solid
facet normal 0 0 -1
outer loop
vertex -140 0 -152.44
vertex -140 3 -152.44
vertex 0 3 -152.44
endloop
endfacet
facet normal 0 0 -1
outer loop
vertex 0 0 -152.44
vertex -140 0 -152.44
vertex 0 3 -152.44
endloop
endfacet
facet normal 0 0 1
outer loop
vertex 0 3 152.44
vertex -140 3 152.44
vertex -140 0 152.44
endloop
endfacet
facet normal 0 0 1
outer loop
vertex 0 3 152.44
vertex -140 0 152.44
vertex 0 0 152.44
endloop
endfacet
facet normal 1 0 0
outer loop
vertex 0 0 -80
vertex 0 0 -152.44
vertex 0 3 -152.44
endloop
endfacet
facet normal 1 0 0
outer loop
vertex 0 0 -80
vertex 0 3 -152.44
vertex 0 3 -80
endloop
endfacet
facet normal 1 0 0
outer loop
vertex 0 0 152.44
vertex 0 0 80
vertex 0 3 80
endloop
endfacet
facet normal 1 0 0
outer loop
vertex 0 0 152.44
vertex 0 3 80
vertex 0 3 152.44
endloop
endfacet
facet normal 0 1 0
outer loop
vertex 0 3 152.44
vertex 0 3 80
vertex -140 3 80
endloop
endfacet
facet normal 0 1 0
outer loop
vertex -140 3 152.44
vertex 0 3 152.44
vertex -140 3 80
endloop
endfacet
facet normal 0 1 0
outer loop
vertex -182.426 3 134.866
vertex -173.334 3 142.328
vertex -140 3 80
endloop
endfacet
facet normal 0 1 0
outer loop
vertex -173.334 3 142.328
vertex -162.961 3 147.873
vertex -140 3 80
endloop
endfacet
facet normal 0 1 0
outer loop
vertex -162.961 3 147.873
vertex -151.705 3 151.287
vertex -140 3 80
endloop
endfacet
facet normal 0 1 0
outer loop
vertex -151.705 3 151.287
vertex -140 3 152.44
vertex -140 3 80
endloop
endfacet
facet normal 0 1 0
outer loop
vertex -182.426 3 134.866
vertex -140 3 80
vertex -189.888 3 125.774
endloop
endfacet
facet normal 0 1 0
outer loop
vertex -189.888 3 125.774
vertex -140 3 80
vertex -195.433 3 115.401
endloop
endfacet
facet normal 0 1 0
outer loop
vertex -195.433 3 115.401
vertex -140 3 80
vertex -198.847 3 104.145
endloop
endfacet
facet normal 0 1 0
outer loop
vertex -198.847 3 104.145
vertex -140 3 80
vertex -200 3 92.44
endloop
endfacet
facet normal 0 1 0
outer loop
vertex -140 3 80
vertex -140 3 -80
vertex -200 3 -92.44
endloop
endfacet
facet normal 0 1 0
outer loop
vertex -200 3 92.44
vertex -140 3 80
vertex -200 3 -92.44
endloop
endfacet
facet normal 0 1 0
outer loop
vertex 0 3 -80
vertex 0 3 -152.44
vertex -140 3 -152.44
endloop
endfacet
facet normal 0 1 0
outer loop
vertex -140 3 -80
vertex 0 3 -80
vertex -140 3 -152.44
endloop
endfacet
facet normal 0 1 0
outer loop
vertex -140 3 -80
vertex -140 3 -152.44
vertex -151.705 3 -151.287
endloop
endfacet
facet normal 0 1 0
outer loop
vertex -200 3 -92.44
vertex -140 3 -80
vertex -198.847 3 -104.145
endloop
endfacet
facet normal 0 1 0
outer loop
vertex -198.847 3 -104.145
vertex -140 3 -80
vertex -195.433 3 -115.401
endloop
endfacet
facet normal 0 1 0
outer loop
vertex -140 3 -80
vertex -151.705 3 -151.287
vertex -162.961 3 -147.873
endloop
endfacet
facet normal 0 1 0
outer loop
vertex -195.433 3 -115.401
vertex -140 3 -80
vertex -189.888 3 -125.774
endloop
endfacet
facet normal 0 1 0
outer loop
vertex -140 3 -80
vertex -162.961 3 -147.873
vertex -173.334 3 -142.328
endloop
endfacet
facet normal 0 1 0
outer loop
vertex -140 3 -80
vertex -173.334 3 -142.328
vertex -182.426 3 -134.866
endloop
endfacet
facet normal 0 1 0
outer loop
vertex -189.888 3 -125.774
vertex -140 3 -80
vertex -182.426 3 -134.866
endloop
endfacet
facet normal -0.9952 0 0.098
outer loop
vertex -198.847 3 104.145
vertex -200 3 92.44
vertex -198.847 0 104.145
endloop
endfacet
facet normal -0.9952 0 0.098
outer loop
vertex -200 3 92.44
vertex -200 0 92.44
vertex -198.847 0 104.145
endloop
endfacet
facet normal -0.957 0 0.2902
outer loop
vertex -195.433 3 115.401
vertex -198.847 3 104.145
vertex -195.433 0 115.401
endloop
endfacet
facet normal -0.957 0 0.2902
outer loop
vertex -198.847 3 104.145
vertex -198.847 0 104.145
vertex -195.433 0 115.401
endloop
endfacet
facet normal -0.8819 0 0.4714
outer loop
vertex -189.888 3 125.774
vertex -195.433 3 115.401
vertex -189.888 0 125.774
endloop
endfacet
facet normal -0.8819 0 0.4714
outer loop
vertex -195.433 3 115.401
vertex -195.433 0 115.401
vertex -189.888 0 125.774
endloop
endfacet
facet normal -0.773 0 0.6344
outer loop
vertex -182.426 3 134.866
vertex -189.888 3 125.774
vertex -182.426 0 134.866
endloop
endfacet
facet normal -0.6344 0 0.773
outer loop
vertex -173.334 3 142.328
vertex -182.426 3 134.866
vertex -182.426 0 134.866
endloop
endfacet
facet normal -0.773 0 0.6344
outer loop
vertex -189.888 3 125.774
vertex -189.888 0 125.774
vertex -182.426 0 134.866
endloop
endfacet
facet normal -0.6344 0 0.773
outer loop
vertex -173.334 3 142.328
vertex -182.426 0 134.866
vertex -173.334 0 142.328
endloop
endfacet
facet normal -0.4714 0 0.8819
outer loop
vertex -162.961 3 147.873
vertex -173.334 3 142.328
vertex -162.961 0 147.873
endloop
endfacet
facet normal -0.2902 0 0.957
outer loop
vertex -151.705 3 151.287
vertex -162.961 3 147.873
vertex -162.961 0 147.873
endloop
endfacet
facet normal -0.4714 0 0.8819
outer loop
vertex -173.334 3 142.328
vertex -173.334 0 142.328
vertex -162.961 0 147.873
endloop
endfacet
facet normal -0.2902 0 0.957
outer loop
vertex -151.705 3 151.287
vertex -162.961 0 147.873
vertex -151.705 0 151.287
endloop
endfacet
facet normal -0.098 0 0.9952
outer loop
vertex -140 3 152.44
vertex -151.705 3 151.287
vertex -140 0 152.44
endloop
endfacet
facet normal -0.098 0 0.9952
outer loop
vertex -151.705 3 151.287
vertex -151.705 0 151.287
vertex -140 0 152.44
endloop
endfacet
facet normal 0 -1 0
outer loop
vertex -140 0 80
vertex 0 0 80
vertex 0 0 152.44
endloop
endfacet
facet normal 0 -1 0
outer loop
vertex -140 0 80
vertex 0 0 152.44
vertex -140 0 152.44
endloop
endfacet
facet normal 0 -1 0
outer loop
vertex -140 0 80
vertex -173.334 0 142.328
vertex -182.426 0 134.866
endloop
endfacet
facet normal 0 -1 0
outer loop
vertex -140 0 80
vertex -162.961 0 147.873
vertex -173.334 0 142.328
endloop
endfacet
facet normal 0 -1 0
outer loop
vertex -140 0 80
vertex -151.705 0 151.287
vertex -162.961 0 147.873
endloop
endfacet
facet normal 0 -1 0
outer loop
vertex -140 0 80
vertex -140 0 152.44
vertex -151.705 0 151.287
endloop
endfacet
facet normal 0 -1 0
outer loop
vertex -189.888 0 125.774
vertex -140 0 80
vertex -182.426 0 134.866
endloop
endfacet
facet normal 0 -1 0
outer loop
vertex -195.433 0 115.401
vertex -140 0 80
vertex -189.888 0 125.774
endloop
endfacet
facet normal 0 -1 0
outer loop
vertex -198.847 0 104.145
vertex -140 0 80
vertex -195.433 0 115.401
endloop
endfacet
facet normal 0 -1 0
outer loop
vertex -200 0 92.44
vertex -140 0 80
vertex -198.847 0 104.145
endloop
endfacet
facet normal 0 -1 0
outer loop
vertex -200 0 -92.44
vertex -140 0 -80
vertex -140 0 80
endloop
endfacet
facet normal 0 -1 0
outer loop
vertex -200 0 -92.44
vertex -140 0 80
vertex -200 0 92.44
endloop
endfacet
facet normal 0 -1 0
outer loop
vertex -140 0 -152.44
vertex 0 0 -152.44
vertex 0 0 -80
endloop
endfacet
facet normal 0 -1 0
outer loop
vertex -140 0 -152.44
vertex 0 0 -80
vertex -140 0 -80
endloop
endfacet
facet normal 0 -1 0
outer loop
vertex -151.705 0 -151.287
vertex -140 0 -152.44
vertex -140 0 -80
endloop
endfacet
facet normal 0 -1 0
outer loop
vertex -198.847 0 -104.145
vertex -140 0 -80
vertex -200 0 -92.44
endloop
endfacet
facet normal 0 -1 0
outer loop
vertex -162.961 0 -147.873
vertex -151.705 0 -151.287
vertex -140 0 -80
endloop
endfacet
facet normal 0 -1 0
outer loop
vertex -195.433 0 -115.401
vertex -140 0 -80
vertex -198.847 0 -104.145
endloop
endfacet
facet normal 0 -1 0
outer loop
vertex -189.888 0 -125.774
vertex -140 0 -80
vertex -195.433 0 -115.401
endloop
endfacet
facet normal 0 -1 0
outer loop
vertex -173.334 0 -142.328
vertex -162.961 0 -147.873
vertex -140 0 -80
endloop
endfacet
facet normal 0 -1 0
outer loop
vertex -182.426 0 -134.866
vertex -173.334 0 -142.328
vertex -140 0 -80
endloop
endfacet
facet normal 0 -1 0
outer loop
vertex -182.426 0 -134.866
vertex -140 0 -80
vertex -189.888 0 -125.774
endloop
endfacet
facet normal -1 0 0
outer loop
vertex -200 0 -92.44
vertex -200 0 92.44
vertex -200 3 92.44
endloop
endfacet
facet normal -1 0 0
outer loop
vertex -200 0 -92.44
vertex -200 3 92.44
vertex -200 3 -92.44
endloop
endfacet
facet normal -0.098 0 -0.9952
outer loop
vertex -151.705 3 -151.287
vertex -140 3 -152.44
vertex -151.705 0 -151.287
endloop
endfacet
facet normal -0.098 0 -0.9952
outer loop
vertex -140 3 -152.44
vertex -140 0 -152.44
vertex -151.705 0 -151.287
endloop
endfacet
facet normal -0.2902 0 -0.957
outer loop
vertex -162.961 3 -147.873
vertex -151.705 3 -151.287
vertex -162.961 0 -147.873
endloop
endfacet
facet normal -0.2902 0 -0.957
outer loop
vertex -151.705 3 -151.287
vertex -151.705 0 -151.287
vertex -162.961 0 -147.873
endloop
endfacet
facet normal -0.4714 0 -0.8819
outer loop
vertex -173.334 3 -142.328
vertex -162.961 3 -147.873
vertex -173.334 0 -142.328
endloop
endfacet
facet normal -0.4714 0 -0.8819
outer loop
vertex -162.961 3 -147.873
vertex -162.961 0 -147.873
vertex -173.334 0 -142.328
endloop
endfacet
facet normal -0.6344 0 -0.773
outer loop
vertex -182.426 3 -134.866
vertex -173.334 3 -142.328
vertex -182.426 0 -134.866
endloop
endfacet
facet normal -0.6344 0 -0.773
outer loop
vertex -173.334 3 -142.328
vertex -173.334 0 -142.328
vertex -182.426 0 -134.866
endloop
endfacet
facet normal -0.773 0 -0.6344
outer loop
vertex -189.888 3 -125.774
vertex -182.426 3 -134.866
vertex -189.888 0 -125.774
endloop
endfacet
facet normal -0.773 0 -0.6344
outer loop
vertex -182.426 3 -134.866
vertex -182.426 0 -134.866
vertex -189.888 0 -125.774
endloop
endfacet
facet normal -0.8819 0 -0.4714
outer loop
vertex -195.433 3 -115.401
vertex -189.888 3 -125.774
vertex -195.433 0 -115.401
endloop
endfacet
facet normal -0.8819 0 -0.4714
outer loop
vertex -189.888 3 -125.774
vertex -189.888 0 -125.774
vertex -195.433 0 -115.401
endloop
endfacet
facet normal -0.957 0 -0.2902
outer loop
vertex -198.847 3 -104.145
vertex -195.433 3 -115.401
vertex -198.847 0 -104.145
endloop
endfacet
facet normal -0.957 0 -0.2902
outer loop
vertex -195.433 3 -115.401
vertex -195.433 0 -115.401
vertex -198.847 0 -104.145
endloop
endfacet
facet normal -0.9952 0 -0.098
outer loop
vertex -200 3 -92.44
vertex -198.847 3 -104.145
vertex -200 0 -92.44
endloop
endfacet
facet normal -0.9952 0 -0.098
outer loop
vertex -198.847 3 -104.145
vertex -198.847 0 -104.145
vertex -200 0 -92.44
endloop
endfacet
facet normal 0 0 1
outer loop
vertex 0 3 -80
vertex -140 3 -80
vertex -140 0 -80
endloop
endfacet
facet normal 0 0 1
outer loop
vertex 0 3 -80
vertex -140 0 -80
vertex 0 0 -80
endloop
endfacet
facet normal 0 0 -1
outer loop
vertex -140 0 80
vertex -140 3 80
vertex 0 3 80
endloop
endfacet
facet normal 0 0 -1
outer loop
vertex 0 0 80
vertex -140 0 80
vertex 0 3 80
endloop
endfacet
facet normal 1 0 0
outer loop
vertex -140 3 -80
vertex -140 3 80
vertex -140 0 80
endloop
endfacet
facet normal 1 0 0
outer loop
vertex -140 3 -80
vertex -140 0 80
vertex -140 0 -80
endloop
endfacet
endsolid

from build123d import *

# Parameters (mm, degrees)
SALIENTE_EXTRUIR1_DEPTH = 3
CROQUIS2_W              = 200
CROQUIS2_H              = 2.56
CORTAR_EXTRUIR1_DEPTH   = 10
CROQUIS3_W              = 140
CROQUIS3_H              = 160
CORTAR_EXTRUIR2_DEPTH   = 10
REDONDEO1_R             = 60


with BuildPart() as part:
    # Croquis1 → Saliente-Extruir1 (new body)
    with BuildSketch(Plane(origin=(0, 0, 0), x_dir=(1, 0, 0), z_dir=(0, 1, 0))):
        Polygon((-100, 155), (0, 155), (0, -155), (-100, -155), (-150, -155), (-200, -155), (-200, 155), (-150, 155), align=None)
    extrude(amount=SALIENTE_EXTRUIR1_DEPTH)

    # Croquis2 → Cortar-Extruir1 (cut)
    with BuildSketch(Plane(origin=(0, 3, 0), x_dir=(1, 0, 0), z_dir=(0, 1, 0))):
        with Locations((-100, 153.72)):
            Rectangle(CROQUIS2_W, CROQUIS2_H)
        with Locations((-100, -153.72)):
            Rectangle(CROQUIS2_W, CROQUIS2_H)
    extrude(amount=-CORTAR_EXTRUIR1_DEPTH, mode=Mode.SUBTRACT)

    # Croquis3 → Cortar-Extruir2 (cut)
    with BuildSketch(Plane(origin=(0, 3, 0), x_dir=(1, 0, 0), z_dir=(0, 1, 0))):
        with Locations((-70, 0)):
            Rectangle(CROQUIS3_W, CROQUIS3_H)
    extrude(amount=-CORTAR_EXTRUIR2_DEPTH, mode=Mode.SUBTRACT)

    # Redondeo1
    redondeo1_edges = [part.edges().sort_by_distance(p)[0] for p in [
        (-200, 1.5, -152.44),
        (-200, 1.5, 152.44),
    ]]
    fillet(redondeo1_edges, radius=REDONDEO1_R)


solid = part.part
